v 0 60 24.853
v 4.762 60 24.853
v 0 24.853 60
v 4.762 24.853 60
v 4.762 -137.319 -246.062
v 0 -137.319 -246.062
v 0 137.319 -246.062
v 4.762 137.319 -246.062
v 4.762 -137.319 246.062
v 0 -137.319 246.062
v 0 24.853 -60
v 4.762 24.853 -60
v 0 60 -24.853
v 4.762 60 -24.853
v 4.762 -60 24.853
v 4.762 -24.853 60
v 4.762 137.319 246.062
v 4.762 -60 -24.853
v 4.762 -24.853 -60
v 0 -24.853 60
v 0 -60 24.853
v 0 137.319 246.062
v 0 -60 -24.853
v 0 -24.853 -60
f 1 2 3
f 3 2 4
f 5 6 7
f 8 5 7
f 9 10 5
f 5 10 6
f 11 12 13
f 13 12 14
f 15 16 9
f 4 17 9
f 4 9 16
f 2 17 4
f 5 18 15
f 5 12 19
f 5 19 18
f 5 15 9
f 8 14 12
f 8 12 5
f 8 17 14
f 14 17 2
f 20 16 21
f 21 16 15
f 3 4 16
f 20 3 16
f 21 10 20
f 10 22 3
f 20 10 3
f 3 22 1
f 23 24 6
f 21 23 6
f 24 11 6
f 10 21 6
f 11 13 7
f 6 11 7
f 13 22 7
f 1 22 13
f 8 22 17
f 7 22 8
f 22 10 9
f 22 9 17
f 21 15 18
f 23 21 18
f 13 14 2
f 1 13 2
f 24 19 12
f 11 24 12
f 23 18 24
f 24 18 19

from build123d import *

# Parameters (mm, degrees)
SKETCH1_W           = 492.125
SKETCH1_H           = 274.6375
BOSS_EXTRUDE1_DEPTH = 4.7625
CUT_EXTRUDE1_REACH  = 6.763


with BuildPart() as part:
    # Sketch1 → Boss-Extrude1 (new body)
    with BuildSketch(Plane(origin=(0, 0, 0), x_dir=(0, 0, -1), z_dir=(1, 0, 0))):
        Rectangle(SKETCH1_W, SKETCH1_H)
    extrude(amount=BOSS_EXTRUDE1_DEPTH)

    # Sketch2 → Cut-Extrude1 (cut, up to next)
    with BuildSketch(Plane(origin=(4.7625, 0, 0), x_dir=(0, 0, -1), z_dir=(1, 0, 0)), mode=Mode.PRIVATE) as cut_extrude1_sk1:
        Polygon((-24.852813742, -60), (24.852813742, -60), (42.426406871, -42.426406871), (60, -24.852813742), (60, 24.852813742), (24.852813742, 60), (-24.852813742, 60), (-60, 24.852813742), (-60, -24.852813742), align=None)
    cut_extrude1_tool1 = extrude(cut_extrude1_sk1.sketch, amount=-CUT_EXTRUDE1_REACH, mode=Mode.PRIVATE) & part.part
    add(cut_extrude1_tool1.solids().sort_by_distance((4.7625, 0, 0))[0], mode=Mode.SUBTRACT)


solid = part.part
